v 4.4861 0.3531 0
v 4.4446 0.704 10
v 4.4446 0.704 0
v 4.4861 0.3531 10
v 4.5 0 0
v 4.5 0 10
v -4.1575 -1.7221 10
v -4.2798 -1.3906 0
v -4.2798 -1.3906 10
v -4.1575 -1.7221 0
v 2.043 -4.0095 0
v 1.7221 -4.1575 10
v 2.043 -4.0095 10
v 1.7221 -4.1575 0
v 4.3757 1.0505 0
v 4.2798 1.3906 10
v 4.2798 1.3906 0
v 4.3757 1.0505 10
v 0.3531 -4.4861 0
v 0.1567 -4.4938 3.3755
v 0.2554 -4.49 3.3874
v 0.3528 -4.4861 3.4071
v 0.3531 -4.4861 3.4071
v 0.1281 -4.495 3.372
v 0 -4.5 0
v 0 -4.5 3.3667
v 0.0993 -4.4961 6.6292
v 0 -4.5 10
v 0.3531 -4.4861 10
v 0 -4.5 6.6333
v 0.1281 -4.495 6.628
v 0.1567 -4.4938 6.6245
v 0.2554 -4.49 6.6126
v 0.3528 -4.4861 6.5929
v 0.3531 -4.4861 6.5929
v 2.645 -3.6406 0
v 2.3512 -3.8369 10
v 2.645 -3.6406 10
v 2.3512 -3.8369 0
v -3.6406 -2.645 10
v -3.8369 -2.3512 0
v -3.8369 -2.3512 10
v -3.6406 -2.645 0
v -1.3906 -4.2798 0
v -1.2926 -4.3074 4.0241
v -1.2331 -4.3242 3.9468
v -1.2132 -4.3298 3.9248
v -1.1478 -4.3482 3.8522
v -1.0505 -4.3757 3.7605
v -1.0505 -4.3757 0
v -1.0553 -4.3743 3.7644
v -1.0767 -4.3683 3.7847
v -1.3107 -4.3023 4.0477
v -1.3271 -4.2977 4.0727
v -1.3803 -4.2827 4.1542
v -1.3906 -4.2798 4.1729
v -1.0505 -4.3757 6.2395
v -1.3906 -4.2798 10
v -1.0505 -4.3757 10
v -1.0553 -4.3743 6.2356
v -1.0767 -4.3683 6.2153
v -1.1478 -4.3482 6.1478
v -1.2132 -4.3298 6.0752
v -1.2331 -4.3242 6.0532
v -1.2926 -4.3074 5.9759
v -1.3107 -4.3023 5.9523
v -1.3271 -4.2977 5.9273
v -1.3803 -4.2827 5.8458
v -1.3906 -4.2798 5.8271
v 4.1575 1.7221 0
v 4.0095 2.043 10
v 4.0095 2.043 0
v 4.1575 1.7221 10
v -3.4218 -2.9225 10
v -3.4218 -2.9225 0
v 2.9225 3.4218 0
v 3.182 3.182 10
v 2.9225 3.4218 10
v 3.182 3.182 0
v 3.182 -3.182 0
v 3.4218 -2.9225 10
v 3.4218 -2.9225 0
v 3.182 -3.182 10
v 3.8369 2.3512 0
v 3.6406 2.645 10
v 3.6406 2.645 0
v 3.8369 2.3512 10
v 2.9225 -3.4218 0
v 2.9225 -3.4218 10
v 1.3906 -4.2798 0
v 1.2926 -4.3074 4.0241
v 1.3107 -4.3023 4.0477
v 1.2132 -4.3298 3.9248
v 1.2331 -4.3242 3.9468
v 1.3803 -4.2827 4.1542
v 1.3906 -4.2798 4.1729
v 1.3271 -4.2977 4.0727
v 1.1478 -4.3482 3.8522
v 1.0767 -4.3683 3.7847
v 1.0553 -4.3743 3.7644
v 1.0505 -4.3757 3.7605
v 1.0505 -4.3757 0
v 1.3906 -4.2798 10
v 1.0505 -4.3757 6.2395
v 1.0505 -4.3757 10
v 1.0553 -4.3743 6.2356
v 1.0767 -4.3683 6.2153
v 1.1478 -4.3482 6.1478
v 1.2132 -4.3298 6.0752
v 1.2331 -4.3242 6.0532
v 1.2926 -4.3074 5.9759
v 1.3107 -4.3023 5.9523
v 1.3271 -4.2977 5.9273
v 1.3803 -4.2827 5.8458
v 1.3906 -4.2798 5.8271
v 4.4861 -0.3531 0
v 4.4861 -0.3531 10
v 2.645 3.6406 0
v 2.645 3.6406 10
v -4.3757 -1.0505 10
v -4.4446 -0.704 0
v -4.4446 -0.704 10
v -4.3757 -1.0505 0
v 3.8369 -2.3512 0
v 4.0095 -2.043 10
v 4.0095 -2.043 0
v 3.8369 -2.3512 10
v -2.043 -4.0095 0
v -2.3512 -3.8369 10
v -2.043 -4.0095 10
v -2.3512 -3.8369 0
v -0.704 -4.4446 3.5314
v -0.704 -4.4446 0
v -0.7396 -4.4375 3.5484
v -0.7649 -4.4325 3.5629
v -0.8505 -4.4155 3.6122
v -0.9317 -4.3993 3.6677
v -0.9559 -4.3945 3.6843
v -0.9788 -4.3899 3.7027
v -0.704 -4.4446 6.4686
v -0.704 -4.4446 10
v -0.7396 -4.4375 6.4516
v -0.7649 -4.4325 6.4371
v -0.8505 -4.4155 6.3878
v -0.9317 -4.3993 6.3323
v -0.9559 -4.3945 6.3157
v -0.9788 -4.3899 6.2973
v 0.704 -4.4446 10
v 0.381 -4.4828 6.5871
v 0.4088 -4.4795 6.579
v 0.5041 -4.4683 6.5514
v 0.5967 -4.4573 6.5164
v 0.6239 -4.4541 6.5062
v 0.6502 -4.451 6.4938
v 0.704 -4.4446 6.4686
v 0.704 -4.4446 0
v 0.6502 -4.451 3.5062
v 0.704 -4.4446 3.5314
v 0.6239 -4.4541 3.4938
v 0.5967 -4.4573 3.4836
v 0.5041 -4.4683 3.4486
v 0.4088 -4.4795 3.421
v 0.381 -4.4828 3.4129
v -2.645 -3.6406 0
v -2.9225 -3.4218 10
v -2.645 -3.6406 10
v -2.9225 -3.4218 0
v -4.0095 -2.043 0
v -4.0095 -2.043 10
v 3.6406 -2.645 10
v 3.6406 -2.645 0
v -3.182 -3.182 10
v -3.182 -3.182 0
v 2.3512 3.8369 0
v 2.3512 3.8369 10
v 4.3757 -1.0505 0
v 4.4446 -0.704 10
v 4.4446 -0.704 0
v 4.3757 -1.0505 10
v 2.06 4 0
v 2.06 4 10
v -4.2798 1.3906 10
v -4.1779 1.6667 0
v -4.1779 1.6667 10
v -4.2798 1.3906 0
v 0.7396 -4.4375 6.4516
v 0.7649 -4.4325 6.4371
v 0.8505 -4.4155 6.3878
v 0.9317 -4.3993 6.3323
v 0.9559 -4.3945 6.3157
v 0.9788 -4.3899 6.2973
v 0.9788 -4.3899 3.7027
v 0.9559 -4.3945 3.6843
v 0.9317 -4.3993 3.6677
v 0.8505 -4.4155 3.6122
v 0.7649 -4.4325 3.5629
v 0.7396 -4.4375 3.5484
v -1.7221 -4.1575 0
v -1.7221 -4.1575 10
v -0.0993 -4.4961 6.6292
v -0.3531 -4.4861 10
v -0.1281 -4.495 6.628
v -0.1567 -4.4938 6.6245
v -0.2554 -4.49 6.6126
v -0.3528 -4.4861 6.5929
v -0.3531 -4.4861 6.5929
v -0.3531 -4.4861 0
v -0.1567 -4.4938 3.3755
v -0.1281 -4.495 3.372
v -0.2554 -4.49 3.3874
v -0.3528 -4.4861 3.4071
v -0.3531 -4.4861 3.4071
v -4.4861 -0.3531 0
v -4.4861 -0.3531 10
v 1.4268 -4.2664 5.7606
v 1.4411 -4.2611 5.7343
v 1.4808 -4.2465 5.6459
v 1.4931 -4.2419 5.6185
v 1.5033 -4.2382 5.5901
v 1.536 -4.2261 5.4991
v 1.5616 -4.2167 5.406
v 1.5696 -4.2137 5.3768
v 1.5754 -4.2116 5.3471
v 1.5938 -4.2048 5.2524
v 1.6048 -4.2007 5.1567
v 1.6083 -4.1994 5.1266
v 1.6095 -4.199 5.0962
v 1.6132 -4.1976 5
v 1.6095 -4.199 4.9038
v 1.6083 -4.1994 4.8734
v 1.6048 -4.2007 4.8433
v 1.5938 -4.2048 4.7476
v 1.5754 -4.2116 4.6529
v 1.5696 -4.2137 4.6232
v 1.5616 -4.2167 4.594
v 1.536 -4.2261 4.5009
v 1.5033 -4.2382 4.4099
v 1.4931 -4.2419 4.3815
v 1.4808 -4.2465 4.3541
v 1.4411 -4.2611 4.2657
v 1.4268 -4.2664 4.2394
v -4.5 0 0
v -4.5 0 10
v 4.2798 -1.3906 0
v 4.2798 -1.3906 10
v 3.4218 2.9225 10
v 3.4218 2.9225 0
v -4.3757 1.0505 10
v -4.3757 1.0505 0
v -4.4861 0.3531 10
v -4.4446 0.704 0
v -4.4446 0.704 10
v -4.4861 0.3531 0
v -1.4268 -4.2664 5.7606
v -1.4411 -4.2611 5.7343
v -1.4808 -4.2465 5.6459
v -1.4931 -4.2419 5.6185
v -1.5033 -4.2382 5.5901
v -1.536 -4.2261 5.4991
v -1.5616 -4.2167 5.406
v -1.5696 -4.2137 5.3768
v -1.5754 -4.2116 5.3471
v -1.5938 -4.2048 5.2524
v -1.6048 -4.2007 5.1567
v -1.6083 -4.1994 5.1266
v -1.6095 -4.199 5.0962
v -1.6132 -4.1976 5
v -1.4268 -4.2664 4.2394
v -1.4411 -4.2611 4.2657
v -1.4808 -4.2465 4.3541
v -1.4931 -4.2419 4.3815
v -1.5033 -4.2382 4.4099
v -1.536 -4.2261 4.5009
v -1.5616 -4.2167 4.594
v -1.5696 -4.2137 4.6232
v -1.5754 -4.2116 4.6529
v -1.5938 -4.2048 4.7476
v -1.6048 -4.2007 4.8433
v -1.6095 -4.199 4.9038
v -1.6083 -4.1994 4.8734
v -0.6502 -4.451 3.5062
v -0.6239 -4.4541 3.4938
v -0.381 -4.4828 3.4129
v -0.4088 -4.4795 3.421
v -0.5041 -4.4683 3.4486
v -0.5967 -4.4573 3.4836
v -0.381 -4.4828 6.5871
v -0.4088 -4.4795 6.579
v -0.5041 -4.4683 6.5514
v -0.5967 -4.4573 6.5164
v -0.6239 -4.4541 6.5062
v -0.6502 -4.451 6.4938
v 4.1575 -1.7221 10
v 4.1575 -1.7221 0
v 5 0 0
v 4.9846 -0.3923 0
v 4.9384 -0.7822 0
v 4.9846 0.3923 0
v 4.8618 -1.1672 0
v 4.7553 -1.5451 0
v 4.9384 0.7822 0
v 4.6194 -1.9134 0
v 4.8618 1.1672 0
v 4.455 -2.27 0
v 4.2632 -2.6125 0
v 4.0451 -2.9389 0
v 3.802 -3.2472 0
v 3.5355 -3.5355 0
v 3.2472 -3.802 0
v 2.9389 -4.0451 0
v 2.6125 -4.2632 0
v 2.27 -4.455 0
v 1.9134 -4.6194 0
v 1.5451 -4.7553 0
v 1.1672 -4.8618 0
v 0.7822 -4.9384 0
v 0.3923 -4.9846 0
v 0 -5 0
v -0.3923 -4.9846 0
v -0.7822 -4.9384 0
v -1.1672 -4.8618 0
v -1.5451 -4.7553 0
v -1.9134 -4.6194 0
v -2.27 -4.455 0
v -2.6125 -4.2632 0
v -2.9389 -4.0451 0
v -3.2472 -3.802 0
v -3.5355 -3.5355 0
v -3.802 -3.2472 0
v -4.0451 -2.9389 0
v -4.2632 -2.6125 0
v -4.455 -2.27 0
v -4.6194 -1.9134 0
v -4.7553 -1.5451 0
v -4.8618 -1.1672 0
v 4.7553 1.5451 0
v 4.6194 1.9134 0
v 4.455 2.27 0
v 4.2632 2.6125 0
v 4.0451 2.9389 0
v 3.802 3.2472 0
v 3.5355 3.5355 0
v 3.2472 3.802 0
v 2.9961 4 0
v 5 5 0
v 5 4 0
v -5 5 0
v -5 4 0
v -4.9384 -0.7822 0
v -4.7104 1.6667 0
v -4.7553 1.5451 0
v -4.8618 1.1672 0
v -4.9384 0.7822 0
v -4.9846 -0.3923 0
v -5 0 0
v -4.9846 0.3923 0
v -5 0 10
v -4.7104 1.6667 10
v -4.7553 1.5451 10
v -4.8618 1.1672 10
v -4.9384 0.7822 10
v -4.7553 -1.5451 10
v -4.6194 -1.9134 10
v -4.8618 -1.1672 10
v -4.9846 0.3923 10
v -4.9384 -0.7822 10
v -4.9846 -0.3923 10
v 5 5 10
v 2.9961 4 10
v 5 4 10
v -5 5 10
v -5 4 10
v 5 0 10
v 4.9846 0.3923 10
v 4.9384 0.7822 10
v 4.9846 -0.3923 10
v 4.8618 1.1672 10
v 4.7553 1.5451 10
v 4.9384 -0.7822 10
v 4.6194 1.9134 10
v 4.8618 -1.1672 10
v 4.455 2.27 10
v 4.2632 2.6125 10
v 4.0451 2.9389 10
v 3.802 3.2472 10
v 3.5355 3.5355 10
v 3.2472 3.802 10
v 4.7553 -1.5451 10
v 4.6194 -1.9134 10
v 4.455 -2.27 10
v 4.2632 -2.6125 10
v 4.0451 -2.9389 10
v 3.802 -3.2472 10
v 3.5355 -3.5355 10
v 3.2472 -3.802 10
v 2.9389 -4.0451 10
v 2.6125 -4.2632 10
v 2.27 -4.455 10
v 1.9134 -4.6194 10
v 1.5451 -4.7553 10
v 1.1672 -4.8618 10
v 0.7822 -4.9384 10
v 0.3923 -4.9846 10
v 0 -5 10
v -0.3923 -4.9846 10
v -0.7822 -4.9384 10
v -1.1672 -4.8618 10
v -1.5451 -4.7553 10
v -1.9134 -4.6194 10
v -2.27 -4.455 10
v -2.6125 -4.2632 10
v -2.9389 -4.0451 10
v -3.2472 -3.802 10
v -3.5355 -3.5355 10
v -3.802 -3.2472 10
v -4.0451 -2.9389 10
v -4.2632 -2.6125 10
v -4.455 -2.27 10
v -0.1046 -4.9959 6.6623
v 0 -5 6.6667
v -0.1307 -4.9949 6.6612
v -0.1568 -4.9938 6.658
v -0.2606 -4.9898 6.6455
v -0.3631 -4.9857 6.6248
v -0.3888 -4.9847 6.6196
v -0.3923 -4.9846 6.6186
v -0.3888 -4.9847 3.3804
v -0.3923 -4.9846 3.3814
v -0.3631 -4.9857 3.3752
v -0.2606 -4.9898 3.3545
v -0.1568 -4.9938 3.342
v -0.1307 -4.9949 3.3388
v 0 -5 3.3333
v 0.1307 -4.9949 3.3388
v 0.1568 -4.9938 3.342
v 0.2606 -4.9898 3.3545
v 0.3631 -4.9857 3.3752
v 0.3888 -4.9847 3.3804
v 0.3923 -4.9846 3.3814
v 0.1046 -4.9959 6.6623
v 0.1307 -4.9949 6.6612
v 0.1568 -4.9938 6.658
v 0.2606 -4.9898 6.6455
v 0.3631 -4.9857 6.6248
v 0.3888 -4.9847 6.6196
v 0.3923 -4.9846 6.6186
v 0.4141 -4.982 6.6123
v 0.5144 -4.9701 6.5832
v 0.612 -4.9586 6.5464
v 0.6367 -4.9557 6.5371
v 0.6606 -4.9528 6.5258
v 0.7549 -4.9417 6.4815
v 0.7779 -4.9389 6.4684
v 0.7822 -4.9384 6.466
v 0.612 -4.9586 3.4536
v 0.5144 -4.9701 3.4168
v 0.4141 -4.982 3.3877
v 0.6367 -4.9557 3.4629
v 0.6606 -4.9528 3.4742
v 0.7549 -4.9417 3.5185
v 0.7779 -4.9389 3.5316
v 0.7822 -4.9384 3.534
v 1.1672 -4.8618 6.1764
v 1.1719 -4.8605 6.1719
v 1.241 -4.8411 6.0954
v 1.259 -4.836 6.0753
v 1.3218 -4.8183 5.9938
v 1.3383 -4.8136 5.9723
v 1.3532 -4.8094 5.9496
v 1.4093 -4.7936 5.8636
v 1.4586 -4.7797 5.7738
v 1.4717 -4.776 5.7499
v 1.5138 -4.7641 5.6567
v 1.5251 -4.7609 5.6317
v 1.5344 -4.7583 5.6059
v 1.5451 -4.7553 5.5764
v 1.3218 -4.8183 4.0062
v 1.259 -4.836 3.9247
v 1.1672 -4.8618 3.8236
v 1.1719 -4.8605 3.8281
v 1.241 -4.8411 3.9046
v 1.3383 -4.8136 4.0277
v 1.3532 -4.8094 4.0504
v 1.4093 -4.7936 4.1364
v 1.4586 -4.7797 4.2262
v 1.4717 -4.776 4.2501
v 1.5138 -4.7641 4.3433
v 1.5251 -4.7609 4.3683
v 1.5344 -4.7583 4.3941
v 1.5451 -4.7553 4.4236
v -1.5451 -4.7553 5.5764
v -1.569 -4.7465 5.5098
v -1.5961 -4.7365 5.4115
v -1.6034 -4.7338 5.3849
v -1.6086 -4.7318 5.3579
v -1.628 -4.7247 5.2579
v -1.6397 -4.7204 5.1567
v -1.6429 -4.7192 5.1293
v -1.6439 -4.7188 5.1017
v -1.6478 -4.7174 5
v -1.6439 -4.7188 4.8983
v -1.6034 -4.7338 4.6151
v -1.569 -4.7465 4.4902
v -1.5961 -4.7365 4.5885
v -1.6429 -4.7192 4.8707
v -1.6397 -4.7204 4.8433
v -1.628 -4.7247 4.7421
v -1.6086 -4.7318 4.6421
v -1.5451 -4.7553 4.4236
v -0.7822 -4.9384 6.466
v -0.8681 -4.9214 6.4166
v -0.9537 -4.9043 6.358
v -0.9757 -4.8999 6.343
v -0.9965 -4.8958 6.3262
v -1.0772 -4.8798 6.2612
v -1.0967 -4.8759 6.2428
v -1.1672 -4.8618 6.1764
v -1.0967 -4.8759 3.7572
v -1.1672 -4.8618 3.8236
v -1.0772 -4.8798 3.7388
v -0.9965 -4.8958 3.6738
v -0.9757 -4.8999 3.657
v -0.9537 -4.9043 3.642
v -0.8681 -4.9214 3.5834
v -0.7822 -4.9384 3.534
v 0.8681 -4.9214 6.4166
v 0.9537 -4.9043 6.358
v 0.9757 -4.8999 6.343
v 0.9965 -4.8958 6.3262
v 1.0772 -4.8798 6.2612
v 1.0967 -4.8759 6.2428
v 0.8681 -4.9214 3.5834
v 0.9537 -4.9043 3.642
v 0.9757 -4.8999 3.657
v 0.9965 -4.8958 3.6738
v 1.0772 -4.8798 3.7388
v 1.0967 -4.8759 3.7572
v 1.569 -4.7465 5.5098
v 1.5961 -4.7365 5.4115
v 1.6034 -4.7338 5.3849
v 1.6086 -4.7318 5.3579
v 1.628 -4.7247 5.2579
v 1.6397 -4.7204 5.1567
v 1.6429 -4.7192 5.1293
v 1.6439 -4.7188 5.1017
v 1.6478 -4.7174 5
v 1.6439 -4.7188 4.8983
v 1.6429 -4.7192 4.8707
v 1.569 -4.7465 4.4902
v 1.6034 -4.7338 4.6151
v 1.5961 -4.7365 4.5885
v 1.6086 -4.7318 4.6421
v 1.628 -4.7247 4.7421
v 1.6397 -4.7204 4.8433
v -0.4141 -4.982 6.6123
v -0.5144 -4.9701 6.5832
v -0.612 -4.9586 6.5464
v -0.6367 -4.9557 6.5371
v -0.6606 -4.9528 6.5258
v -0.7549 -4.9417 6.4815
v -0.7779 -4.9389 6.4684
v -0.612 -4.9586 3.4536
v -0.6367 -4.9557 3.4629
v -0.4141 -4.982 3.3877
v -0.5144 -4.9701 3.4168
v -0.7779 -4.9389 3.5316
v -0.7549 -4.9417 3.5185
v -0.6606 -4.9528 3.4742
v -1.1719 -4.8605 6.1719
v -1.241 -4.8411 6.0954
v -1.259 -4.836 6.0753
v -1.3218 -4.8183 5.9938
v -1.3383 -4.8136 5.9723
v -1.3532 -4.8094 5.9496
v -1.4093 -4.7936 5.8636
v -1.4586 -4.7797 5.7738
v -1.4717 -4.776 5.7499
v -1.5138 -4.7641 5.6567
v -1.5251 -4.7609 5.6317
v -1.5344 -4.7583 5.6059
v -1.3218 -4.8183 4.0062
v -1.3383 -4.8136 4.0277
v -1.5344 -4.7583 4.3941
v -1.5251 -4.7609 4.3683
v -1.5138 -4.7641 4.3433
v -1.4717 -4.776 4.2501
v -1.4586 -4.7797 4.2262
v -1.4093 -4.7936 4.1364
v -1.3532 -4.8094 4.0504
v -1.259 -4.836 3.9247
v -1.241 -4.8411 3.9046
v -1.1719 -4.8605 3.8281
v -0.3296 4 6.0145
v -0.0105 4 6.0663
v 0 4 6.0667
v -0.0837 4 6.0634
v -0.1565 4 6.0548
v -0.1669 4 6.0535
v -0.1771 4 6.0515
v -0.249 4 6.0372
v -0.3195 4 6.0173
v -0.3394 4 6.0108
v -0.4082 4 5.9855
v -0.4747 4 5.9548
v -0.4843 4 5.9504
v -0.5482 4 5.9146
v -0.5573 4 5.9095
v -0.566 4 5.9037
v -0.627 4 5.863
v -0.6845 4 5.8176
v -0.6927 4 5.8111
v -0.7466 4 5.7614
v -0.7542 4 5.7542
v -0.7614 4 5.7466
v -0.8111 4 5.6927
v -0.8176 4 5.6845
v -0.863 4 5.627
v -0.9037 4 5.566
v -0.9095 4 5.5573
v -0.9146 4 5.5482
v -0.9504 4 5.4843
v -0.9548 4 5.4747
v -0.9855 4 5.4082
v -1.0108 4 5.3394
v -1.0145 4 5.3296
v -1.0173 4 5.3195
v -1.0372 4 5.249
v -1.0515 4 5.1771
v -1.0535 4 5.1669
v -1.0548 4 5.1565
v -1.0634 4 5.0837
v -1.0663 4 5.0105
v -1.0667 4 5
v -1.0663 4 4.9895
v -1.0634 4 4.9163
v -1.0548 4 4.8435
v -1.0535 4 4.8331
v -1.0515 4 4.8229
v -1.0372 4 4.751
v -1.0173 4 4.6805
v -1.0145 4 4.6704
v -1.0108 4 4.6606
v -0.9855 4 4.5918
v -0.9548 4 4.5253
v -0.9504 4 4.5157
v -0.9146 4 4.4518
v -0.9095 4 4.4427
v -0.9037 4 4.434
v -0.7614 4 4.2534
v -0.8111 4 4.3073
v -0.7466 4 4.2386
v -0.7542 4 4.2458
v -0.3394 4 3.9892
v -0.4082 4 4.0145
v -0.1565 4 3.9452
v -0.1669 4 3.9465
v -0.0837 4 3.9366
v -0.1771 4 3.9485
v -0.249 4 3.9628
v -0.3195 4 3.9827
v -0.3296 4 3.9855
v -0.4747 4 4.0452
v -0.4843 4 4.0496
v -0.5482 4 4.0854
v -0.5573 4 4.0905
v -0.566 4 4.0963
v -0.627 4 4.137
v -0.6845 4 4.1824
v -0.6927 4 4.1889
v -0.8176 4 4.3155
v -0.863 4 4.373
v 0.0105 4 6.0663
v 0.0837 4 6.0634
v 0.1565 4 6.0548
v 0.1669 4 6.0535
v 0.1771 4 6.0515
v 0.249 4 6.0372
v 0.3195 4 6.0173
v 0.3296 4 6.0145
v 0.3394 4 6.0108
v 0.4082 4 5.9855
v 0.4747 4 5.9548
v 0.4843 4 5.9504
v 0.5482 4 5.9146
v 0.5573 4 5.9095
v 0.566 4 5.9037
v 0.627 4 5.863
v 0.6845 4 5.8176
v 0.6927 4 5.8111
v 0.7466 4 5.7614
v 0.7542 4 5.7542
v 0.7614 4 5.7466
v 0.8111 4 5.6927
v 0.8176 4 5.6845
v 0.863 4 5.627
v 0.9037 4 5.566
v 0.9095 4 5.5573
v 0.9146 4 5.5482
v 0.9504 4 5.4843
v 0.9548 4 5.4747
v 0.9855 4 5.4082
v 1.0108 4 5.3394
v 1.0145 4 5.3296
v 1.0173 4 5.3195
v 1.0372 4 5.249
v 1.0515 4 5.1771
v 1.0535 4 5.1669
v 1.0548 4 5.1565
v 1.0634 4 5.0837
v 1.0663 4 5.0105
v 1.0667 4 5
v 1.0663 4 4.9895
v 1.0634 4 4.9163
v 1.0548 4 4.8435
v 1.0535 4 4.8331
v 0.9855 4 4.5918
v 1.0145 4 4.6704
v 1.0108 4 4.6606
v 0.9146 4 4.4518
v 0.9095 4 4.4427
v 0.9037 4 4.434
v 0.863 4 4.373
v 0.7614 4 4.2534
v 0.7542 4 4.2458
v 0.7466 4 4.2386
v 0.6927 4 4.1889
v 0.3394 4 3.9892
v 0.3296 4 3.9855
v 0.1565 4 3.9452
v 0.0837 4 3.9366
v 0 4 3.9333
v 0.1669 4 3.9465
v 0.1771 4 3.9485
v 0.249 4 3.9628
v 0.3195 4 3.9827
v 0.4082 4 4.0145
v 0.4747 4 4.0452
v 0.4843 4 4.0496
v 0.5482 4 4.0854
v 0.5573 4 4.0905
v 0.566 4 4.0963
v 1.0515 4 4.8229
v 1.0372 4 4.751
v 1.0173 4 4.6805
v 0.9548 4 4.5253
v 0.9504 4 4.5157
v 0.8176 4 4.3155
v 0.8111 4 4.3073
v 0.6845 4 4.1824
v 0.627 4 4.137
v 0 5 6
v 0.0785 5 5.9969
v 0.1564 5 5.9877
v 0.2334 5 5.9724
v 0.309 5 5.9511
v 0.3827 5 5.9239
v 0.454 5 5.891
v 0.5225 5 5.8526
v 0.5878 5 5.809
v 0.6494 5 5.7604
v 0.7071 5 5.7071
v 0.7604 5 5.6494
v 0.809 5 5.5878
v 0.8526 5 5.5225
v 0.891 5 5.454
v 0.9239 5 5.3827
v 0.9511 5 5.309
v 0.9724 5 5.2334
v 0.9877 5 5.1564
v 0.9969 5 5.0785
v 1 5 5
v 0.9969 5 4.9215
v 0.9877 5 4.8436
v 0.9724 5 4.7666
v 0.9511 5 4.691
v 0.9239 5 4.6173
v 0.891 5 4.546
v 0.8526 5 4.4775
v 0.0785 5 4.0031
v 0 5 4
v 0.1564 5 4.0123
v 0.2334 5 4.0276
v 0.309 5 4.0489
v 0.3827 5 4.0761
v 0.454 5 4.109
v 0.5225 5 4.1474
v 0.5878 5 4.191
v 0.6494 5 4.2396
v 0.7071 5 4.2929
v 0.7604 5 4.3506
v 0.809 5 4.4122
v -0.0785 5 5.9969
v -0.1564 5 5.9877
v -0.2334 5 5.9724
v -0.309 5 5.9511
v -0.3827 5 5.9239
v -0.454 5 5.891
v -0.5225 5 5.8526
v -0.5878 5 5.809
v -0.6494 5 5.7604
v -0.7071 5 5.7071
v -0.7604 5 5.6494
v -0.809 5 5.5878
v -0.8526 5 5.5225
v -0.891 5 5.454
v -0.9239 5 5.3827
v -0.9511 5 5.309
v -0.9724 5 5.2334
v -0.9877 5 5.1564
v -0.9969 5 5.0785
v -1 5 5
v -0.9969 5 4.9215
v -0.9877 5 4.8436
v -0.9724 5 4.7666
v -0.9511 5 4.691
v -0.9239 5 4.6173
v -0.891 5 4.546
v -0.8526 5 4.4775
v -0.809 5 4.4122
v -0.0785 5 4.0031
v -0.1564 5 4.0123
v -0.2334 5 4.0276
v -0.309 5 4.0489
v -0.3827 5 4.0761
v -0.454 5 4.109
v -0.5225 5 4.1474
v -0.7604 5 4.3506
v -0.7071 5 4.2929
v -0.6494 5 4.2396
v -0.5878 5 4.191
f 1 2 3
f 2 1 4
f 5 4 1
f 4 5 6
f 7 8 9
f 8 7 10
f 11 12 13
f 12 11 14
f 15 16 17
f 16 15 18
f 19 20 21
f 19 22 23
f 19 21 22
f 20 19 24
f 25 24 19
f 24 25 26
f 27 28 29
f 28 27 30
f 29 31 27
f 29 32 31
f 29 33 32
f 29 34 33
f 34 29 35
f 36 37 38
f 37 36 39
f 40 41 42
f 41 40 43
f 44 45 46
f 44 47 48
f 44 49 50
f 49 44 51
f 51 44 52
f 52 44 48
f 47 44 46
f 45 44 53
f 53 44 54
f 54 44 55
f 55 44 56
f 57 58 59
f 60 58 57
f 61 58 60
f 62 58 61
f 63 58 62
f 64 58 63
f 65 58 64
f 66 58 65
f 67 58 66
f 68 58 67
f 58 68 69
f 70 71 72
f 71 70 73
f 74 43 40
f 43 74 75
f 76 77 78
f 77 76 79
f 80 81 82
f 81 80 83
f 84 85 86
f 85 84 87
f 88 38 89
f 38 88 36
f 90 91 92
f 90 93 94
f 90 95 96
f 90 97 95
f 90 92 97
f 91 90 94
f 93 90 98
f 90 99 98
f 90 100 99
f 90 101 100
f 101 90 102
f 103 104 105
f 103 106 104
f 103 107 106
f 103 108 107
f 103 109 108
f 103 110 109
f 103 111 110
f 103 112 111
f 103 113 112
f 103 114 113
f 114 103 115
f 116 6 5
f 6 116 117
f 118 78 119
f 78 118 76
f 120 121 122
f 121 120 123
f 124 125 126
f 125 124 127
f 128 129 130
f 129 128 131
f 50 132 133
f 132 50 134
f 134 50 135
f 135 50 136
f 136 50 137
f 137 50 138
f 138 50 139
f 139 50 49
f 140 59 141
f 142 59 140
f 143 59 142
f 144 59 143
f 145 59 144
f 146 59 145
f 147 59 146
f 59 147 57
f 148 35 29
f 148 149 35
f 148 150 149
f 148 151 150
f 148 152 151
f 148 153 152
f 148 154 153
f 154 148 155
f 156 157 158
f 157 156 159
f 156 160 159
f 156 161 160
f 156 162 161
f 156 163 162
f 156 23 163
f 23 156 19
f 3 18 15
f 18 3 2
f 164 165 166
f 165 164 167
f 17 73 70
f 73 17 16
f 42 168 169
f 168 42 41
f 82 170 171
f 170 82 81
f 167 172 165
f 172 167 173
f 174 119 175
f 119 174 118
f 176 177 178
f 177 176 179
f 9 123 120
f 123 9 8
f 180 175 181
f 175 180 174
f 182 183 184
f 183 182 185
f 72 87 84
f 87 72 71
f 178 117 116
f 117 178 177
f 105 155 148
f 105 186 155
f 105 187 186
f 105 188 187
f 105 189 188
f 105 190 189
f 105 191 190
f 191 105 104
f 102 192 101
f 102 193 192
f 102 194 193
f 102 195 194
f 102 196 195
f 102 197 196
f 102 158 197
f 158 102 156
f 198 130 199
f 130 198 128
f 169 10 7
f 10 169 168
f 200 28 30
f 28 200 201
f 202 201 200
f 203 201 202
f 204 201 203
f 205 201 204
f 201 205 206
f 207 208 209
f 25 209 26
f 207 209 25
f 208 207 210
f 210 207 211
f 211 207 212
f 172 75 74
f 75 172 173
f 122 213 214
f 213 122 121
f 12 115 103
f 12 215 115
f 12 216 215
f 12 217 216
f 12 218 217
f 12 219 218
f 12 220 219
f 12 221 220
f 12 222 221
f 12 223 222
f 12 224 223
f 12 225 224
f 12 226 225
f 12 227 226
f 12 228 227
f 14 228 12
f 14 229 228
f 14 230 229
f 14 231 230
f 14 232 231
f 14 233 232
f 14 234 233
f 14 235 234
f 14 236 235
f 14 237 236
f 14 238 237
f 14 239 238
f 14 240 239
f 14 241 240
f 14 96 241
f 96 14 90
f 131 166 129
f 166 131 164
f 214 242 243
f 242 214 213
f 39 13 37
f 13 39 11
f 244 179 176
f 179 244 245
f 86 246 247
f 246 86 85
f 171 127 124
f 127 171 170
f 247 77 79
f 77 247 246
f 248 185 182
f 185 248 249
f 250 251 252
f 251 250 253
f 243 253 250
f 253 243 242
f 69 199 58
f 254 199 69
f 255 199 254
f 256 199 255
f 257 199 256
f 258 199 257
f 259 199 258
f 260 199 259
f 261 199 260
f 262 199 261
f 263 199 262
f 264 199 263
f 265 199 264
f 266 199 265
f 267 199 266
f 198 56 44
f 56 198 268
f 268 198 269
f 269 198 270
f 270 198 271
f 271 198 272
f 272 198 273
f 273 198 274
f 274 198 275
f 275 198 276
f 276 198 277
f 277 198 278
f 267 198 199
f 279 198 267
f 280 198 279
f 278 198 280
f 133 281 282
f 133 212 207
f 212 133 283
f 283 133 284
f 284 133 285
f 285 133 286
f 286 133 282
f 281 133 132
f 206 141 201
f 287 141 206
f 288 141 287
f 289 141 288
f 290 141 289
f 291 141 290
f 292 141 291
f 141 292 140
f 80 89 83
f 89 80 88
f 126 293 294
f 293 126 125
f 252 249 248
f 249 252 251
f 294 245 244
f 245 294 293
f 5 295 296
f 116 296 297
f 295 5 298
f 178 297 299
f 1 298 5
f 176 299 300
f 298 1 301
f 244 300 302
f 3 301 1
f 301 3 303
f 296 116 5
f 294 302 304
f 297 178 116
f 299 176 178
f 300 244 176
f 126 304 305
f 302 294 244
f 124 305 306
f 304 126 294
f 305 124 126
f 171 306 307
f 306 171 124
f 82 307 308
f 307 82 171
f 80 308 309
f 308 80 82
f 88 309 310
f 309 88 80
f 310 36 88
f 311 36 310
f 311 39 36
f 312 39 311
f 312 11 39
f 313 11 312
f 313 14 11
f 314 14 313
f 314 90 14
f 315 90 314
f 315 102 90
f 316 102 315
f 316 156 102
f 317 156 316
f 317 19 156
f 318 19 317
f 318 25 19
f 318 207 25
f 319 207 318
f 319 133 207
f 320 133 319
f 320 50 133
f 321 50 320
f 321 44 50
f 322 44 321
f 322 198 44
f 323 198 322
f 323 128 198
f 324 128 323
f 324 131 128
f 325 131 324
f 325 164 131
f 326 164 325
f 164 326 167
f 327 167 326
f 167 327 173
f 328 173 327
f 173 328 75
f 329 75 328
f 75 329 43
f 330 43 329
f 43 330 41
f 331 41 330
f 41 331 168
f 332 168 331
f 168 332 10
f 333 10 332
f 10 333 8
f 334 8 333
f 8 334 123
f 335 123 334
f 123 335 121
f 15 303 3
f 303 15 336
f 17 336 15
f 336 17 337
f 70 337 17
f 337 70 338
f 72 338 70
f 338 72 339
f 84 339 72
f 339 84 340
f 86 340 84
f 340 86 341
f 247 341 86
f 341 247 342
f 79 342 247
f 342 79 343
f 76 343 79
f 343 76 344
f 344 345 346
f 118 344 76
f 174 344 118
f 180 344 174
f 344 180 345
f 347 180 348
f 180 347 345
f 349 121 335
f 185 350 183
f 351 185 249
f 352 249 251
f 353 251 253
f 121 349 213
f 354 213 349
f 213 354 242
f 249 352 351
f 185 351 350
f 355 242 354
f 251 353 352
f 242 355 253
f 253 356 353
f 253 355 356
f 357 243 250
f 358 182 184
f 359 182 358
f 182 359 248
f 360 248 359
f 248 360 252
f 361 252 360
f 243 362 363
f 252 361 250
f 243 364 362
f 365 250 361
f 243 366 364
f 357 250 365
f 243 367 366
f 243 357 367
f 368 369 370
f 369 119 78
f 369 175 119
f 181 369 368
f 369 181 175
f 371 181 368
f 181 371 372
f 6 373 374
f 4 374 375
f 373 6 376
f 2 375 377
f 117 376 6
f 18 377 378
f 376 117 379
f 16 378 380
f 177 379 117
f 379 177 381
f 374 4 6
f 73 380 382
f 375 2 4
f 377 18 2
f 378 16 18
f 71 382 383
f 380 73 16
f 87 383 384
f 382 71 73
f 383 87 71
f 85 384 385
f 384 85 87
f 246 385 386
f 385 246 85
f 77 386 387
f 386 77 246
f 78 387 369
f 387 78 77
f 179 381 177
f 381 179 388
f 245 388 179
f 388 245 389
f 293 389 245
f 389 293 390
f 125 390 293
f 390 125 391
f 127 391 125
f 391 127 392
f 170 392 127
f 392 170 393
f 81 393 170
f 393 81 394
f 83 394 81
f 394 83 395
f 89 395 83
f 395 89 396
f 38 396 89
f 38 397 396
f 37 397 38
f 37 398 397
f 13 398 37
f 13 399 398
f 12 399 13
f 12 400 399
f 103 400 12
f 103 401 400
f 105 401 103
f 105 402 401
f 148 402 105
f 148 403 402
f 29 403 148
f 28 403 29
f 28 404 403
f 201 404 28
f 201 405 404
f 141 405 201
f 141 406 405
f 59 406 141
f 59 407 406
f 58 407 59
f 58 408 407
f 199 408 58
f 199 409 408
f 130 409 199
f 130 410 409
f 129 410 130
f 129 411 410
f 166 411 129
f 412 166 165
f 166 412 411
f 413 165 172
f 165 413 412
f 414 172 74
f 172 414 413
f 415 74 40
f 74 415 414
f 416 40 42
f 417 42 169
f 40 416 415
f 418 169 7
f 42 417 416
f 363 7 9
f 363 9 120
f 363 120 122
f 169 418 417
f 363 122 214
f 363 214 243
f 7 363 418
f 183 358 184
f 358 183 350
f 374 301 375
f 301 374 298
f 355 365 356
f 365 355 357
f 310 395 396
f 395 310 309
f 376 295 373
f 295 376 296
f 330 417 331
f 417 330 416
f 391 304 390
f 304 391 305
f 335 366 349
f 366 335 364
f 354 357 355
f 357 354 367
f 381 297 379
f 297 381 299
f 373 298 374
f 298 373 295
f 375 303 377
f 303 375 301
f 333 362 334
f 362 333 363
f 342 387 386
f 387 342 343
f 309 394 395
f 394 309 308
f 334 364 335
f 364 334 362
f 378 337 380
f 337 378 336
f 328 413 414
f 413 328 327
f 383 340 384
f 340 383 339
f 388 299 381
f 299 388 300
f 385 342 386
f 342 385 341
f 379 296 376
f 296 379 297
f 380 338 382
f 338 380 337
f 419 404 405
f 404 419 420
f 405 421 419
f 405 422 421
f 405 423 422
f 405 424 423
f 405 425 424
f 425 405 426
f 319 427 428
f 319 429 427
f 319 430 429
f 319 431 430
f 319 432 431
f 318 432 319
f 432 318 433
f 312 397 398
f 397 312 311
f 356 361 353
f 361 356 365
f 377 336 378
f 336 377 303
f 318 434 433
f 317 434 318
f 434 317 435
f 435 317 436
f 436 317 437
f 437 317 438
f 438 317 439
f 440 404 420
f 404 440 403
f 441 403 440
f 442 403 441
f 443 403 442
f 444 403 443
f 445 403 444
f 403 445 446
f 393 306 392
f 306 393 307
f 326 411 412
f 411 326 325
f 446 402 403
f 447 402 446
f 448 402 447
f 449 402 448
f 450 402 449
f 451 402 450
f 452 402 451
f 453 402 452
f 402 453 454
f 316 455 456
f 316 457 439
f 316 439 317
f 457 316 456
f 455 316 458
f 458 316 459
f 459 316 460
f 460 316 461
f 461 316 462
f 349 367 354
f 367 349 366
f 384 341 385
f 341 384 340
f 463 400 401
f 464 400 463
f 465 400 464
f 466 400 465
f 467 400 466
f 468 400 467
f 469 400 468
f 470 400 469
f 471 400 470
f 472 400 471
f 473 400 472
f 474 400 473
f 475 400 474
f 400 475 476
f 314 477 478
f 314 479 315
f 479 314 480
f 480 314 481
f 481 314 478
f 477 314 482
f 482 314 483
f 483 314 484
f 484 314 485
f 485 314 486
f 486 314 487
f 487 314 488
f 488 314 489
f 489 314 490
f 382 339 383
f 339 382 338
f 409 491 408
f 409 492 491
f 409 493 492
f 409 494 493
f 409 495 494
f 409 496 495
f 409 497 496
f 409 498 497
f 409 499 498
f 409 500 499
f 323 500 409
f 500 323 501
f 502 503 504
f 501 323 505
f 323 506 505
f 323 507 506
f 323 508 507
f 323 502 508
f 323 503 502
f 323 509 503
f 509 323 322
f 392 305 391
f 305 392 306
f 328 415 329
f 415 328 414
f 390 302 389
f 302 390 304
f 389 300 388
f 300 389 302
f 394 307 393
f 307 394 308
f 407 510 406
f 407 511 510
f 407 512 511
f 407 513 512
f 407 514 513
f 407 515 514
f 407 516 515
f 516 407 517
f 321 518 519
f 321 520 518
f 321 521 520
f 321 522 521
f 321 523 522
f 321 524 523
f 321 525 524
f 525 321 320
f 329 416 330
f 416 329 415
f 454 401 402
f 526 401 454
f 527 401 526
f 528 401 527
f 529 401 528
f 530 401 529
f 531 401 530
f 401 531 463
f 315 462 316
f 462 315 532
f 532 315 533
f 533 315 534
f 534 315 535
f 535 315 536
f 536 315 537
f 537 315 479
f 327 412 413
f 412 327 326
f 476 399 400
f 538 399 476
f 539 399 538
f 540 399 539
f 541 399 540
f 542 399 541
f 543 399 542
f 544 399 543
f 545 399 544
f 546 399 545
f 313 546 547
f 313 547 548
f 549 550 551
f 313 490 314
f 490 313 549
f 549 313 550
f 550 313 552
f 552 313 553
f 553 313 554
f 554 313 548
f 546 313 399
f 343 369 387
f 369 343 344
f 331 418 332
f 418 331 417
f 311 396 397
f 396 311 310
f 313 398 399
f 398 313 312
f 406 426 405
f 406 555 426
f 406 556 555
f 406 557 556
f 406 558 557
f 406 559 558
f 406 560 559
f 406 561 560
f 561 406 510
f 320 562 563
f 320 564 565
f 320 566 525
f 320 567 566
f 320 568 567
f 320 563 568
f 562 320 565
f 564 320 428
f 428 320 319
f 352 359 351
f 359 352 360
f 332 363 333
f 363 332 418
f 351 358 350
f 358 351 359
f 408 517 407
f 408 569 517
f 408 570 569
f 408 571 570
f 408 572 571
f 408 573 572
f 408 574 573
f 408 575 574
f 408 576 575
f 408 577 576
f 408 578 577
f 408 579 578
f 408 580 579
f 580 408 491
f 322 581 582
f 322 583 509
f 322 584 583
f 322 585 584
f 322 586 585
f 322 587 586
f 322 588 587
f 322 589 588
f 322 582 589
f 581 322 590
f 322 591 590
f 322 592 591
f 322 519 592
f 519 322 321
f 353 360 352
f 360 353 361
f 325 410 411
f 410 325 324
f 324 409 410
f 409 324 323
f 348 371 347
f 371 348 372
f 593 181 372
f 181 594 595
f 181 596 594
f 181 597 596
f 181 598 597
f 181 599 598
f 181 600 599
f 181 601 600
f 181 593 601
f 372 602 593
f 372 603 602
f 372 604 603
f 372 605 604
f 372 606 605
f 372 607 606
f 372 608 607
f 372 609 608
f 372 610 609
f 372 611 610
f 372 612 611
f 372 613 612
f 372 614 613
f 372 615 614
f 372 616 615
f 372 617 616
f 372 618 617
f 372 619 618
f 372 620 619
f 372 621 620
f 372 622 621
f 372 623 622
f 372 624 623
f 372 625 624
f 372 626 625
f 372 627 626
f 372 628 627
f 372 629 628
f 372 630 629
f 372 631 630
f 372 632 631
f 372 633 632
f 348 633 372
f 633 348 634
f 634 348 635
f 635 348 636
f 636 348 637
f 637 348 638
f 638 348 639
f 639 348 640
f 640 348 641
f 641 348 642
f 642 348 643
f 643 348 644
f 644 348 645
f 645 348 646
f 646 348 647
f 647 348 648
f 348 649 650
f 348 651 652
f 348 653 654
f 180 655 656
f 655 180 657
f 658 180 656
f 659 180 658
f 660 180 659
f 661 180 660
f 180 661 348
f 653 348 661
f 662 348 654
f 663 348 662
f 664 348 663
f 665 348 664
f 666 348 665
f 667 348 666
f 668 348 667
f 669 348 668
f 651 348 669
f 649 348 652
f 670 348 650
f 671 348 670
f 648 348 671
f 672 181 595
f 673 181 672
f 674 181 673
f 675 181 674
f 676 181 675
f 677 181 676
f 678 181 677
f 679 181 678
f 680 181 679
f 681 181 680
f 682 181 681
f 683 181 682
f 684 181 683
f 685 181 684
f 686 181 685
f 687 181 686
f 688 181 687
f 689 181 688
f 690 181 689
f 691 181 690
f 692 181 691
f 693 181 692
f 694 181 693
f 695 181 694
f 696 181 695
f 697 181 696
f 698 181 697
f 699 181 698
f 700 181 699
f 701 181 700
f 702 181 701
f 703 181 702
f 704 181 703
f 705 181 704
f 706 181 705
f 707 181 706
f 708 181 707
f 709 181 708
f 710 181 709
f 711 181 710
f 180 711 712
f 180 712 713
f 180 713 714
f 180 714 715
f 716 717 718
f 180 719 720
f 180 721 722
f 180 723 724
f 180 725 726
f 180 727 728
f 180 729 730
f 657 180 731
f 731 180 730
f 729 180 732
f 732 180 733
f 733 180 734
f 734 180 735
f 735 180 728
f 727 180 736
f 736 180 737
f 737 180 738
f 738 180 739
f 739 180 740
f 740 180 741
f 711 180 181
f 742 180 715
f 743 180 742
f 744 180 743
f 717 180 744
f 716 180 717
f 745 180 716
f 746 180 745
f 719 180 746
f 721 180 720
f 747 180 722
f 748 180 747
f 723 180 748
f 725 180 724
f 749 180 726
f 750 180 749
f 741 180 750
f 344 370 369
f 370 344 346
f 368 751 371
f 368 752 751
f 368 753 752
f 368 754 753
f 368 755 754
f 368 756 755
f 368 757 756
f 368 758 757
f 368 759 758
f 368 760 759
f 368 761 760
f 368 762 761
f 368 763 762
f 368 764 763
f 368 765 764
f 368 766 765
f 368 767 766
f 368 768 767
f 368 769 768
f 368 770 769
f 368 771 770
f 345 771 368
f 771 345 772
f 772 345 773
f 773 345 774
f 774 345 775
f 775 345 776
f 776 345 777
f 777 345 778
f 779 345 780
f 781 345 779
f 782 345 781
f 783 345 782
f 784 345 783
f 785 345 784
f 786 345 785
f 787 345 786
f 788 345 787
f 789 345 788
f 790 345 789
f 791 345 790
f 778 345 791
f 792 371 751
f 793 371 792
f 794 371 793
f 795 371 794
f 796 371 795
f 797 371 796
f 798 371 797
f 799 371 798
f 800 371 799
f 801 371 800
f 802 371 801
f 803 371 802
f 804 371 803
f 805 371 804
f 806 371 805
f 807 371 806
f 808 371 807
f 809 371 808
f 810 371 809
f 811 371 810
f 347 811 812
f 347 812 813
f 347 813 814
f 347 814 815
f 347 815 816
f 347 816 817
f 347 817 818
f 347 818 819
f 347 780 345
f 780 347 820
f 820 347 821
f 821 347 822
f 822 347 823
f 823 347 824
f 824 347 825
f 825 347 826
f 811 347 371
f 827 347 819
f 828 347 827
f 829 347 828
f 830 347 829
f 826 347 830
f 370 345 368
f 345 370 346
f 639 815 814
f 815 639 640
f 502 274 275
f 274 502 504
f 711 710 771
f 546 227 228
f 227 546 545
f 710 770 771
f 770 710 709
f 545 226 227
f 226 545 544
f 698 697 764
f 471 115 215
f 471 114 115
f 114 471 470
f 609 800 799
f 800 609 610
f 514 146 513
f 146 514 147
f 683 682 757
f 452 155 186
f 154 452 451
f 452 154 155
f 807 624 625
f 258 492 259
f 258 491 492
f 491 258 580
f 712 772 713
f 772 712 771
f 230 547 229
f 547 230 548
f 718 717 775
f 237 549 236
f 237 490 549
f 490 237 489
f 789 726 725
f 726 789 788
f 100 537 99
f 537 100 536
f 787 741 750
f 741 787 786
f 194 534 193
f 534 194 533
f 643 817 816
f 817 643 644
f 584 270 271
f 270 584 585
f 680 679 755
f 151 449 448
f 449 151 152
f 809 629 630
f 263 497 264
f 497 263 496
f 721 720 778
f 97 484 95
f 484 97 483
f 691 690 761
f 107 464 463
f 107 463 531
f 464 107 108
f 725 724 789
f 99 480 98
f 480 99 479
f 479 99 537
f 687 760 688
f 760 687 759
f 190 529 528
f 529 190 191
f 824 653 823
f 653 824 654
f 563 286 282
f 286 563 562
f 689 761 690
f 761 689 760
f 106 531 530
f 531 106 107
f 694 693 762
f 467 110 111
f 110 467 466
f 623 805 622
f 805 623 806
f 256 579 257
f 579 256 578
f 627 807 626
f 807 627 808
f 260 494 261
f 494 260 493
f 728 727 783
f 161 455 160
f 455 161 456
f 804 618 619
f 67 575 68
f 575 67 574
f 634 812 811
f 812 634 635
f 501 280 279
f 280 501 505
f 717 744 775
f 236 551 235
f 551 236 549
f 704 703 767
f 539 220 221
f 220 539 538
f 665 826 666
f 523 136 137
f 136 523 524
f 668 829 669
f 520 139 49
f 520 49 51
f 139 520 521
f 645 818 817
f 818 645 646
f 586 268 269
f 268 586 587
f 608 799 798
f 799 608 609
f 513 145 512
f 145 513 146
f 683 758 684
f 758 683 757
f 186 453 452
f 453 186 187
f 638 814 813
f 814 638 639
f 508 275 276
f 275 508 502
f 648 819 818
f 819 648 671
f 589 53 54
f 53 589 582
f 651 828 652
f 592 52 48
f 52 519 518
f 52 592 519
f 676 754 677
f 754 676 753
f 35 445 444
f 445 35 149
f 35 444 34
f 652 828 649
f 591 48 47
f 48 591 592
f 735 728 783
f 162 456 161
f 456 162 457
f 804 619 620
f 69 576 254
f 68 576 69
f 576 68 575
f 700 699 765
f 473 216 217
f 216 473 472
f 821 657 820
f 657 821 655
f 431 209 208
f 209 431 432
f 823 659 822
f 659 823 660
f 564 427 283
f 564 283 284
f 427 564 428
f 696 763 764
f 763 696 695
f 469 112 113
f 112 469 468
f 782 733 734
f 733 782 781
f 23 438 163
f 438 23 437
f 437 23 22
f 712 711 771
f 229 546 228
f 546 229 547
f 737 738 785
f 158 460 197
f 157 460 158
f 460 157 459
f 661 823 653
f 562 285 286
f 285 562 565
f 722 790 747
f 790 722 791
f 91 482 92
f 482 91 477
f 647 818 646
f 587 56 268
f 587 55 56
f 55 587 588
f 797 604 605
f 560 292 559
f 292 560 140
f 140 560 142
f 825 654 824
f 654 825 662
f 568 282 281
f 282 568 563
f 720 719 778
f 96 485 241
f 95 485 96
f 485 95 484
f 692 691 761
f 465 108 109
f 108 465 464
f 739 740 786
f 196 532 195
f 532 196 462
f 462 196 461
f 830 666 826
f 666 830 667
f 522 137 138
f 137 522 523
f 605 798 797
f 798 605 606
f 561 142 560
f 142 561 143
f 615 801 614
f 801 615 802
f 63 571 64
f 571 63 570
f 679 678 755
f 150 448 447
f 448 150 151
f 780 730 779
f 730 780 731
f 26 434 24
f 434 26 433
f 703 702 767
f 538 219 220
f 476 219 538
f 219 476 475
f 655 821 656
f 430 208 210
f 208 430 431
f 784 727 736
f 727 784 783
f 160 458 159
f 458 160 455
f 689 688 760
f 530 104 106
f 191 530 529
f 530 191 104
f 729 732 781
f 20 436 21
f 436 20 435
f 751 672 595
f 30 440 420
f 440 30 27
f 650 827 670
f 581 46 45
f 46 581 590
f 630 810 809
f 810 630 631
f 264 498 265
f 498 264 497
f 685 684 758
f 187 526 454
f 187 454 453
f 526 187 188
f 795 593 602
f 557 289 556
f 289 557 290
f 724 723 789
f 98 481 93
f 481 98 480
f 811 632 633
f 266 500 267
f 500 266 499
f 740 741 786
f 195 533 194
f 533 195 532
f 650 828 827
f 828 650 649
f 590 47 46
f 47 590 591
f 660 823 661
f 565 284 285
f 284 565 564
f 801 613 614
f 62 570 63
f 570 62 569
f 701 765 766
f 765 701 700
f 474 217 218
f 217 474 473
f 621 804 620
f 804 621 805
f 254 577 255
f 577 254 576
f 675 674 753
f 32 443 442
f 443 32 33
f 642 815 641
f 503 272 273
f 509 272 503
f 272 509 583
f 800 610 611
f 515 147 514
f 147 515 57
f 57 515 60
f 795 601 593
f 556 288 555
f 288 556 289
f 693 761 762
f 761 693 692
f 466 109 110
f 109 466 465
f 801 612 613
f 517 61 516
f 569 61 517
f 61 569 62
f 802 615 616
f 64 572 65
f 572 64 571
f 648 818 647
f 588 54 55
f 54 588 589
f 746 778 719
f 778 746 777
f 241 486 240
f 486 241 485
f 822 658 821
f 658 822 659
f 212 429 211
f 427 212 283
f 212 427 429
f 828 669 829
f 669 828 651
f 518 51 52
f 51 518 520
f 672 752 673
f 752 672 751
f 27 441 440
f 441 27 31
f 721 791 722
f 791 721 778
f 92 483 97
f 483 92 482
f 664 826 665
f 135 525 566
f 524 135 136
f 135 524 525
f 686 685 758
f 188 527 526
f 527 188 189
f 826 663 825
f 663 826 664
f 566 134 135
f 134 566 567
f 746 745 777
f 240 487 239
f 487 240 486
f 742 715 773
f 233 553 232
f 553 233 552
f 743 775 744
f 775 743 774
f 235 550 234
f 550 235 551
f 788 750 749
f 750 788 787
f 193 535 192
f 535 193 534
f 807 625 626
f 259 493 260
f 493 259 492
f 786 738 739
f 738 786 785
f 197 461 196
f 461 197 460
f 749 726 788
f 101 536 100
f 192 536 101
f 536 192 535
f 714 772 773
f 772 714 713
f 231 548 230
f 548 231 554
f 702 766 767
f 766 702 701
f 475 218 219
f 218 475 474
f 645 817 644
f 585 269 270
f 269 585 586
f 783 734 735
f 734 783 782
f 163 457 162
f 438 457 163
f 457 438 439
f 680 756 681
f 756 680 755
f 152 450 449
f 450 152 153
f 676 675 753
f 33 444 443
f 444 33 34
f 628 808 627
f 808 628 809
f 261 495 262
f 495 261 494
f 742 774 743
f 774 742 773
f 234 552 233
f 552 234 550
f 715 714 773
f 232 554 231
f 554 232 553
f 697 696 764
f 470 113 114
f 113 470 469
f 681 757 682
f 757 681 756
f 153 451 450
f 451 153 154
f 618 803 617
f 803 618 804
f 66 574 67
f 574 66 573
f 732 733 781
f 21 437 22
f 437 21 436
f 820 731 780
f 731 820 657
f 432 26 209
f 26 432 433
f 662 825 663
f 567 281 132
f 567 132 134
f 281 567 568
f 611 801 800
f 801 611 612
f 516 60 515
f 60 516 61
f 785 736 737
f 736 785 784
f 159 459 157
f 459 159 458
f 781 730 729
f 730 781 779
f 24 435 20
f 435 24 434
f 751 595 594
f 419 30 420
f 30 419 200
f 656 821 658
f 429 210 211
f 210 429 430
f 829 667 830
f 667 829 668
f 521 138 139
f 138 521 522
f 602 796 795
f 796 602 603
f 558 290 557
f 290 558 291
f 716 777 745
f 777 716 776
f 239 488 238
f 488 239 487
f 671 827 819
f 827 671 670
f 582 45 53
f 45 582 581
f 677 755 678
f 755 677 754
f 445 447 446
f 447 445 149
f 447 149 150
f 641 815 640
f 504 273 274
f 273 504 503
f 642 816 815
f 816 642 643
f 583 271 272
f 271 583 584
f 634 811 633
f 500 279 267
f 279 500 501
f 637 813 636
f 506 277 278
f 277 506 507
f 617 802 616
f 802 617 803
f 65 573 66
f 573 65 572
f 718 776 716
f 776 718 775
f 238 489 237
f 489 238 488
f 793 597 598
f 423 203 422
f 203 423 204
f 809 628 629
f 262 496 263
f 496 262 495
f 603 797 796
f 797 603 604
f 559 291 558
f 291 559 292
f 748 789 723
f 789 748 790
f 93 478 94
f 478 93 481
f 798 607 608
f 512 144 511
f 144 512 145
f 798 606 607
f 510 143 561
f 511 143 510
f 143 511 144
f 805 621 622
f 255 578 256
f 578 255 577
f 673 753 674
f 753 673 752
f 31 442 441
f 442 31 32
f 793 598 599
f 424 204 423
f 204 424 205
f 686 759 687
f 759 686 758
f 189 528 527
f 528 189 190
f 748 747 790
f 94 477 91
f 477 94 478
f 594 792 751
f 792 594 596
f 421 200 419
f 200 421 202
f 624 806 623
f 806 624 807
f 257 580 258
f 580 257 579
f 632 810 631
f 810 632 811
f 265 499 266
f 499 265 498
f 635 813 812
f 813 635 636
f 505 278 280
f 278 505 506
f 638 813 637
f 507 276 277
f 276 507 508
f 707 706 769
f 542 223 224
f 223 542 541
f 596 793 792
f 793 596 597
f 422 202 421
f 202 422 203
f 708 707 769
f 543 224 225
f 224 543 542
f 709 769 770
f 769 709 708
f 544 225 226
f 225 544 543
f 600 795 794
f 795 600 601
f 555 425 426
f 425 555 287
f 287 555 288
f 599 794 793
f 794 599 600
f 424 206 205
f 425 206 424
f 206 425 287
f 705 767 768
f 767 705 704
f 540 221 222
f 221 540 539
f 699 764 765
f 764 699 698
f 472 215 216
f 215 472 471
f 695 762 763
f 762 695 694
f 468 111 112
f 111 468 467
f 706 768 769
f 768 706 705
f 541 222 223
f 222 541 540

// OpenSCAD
// cable clips henry piller 2018
// variable description
high=10; // [5:25]
clip=10; // [5:25]
bohrung = 1; //[0:Nein,1:ja]
/* [Hidden] */
$fn=80;
difference(){
union(){
difference() {
 cylinder(h=high,r1=clip/2,r2=clip/2,center=false);
 union(){
    cylinder(h=high,r1=clip/2-.5,r2=clip/2-.5,center=false);
   rotate([90,0,0]) translate([-high,0,-clip/2])  cube([high+.5,high+.5,clip/3],center=false);}}
   rotate([90,0,0]) translate([-clip/2,0,-clip/2])  cube([clip,high,1],center=false);}
if (bohrung==1) {rotate([90,0,0]) translate([0,high/2,-clip/2])   cylinder(h=high*1.5,r1=high/10,r2=high/5,center=false);}
else {// no drill 
 }}
